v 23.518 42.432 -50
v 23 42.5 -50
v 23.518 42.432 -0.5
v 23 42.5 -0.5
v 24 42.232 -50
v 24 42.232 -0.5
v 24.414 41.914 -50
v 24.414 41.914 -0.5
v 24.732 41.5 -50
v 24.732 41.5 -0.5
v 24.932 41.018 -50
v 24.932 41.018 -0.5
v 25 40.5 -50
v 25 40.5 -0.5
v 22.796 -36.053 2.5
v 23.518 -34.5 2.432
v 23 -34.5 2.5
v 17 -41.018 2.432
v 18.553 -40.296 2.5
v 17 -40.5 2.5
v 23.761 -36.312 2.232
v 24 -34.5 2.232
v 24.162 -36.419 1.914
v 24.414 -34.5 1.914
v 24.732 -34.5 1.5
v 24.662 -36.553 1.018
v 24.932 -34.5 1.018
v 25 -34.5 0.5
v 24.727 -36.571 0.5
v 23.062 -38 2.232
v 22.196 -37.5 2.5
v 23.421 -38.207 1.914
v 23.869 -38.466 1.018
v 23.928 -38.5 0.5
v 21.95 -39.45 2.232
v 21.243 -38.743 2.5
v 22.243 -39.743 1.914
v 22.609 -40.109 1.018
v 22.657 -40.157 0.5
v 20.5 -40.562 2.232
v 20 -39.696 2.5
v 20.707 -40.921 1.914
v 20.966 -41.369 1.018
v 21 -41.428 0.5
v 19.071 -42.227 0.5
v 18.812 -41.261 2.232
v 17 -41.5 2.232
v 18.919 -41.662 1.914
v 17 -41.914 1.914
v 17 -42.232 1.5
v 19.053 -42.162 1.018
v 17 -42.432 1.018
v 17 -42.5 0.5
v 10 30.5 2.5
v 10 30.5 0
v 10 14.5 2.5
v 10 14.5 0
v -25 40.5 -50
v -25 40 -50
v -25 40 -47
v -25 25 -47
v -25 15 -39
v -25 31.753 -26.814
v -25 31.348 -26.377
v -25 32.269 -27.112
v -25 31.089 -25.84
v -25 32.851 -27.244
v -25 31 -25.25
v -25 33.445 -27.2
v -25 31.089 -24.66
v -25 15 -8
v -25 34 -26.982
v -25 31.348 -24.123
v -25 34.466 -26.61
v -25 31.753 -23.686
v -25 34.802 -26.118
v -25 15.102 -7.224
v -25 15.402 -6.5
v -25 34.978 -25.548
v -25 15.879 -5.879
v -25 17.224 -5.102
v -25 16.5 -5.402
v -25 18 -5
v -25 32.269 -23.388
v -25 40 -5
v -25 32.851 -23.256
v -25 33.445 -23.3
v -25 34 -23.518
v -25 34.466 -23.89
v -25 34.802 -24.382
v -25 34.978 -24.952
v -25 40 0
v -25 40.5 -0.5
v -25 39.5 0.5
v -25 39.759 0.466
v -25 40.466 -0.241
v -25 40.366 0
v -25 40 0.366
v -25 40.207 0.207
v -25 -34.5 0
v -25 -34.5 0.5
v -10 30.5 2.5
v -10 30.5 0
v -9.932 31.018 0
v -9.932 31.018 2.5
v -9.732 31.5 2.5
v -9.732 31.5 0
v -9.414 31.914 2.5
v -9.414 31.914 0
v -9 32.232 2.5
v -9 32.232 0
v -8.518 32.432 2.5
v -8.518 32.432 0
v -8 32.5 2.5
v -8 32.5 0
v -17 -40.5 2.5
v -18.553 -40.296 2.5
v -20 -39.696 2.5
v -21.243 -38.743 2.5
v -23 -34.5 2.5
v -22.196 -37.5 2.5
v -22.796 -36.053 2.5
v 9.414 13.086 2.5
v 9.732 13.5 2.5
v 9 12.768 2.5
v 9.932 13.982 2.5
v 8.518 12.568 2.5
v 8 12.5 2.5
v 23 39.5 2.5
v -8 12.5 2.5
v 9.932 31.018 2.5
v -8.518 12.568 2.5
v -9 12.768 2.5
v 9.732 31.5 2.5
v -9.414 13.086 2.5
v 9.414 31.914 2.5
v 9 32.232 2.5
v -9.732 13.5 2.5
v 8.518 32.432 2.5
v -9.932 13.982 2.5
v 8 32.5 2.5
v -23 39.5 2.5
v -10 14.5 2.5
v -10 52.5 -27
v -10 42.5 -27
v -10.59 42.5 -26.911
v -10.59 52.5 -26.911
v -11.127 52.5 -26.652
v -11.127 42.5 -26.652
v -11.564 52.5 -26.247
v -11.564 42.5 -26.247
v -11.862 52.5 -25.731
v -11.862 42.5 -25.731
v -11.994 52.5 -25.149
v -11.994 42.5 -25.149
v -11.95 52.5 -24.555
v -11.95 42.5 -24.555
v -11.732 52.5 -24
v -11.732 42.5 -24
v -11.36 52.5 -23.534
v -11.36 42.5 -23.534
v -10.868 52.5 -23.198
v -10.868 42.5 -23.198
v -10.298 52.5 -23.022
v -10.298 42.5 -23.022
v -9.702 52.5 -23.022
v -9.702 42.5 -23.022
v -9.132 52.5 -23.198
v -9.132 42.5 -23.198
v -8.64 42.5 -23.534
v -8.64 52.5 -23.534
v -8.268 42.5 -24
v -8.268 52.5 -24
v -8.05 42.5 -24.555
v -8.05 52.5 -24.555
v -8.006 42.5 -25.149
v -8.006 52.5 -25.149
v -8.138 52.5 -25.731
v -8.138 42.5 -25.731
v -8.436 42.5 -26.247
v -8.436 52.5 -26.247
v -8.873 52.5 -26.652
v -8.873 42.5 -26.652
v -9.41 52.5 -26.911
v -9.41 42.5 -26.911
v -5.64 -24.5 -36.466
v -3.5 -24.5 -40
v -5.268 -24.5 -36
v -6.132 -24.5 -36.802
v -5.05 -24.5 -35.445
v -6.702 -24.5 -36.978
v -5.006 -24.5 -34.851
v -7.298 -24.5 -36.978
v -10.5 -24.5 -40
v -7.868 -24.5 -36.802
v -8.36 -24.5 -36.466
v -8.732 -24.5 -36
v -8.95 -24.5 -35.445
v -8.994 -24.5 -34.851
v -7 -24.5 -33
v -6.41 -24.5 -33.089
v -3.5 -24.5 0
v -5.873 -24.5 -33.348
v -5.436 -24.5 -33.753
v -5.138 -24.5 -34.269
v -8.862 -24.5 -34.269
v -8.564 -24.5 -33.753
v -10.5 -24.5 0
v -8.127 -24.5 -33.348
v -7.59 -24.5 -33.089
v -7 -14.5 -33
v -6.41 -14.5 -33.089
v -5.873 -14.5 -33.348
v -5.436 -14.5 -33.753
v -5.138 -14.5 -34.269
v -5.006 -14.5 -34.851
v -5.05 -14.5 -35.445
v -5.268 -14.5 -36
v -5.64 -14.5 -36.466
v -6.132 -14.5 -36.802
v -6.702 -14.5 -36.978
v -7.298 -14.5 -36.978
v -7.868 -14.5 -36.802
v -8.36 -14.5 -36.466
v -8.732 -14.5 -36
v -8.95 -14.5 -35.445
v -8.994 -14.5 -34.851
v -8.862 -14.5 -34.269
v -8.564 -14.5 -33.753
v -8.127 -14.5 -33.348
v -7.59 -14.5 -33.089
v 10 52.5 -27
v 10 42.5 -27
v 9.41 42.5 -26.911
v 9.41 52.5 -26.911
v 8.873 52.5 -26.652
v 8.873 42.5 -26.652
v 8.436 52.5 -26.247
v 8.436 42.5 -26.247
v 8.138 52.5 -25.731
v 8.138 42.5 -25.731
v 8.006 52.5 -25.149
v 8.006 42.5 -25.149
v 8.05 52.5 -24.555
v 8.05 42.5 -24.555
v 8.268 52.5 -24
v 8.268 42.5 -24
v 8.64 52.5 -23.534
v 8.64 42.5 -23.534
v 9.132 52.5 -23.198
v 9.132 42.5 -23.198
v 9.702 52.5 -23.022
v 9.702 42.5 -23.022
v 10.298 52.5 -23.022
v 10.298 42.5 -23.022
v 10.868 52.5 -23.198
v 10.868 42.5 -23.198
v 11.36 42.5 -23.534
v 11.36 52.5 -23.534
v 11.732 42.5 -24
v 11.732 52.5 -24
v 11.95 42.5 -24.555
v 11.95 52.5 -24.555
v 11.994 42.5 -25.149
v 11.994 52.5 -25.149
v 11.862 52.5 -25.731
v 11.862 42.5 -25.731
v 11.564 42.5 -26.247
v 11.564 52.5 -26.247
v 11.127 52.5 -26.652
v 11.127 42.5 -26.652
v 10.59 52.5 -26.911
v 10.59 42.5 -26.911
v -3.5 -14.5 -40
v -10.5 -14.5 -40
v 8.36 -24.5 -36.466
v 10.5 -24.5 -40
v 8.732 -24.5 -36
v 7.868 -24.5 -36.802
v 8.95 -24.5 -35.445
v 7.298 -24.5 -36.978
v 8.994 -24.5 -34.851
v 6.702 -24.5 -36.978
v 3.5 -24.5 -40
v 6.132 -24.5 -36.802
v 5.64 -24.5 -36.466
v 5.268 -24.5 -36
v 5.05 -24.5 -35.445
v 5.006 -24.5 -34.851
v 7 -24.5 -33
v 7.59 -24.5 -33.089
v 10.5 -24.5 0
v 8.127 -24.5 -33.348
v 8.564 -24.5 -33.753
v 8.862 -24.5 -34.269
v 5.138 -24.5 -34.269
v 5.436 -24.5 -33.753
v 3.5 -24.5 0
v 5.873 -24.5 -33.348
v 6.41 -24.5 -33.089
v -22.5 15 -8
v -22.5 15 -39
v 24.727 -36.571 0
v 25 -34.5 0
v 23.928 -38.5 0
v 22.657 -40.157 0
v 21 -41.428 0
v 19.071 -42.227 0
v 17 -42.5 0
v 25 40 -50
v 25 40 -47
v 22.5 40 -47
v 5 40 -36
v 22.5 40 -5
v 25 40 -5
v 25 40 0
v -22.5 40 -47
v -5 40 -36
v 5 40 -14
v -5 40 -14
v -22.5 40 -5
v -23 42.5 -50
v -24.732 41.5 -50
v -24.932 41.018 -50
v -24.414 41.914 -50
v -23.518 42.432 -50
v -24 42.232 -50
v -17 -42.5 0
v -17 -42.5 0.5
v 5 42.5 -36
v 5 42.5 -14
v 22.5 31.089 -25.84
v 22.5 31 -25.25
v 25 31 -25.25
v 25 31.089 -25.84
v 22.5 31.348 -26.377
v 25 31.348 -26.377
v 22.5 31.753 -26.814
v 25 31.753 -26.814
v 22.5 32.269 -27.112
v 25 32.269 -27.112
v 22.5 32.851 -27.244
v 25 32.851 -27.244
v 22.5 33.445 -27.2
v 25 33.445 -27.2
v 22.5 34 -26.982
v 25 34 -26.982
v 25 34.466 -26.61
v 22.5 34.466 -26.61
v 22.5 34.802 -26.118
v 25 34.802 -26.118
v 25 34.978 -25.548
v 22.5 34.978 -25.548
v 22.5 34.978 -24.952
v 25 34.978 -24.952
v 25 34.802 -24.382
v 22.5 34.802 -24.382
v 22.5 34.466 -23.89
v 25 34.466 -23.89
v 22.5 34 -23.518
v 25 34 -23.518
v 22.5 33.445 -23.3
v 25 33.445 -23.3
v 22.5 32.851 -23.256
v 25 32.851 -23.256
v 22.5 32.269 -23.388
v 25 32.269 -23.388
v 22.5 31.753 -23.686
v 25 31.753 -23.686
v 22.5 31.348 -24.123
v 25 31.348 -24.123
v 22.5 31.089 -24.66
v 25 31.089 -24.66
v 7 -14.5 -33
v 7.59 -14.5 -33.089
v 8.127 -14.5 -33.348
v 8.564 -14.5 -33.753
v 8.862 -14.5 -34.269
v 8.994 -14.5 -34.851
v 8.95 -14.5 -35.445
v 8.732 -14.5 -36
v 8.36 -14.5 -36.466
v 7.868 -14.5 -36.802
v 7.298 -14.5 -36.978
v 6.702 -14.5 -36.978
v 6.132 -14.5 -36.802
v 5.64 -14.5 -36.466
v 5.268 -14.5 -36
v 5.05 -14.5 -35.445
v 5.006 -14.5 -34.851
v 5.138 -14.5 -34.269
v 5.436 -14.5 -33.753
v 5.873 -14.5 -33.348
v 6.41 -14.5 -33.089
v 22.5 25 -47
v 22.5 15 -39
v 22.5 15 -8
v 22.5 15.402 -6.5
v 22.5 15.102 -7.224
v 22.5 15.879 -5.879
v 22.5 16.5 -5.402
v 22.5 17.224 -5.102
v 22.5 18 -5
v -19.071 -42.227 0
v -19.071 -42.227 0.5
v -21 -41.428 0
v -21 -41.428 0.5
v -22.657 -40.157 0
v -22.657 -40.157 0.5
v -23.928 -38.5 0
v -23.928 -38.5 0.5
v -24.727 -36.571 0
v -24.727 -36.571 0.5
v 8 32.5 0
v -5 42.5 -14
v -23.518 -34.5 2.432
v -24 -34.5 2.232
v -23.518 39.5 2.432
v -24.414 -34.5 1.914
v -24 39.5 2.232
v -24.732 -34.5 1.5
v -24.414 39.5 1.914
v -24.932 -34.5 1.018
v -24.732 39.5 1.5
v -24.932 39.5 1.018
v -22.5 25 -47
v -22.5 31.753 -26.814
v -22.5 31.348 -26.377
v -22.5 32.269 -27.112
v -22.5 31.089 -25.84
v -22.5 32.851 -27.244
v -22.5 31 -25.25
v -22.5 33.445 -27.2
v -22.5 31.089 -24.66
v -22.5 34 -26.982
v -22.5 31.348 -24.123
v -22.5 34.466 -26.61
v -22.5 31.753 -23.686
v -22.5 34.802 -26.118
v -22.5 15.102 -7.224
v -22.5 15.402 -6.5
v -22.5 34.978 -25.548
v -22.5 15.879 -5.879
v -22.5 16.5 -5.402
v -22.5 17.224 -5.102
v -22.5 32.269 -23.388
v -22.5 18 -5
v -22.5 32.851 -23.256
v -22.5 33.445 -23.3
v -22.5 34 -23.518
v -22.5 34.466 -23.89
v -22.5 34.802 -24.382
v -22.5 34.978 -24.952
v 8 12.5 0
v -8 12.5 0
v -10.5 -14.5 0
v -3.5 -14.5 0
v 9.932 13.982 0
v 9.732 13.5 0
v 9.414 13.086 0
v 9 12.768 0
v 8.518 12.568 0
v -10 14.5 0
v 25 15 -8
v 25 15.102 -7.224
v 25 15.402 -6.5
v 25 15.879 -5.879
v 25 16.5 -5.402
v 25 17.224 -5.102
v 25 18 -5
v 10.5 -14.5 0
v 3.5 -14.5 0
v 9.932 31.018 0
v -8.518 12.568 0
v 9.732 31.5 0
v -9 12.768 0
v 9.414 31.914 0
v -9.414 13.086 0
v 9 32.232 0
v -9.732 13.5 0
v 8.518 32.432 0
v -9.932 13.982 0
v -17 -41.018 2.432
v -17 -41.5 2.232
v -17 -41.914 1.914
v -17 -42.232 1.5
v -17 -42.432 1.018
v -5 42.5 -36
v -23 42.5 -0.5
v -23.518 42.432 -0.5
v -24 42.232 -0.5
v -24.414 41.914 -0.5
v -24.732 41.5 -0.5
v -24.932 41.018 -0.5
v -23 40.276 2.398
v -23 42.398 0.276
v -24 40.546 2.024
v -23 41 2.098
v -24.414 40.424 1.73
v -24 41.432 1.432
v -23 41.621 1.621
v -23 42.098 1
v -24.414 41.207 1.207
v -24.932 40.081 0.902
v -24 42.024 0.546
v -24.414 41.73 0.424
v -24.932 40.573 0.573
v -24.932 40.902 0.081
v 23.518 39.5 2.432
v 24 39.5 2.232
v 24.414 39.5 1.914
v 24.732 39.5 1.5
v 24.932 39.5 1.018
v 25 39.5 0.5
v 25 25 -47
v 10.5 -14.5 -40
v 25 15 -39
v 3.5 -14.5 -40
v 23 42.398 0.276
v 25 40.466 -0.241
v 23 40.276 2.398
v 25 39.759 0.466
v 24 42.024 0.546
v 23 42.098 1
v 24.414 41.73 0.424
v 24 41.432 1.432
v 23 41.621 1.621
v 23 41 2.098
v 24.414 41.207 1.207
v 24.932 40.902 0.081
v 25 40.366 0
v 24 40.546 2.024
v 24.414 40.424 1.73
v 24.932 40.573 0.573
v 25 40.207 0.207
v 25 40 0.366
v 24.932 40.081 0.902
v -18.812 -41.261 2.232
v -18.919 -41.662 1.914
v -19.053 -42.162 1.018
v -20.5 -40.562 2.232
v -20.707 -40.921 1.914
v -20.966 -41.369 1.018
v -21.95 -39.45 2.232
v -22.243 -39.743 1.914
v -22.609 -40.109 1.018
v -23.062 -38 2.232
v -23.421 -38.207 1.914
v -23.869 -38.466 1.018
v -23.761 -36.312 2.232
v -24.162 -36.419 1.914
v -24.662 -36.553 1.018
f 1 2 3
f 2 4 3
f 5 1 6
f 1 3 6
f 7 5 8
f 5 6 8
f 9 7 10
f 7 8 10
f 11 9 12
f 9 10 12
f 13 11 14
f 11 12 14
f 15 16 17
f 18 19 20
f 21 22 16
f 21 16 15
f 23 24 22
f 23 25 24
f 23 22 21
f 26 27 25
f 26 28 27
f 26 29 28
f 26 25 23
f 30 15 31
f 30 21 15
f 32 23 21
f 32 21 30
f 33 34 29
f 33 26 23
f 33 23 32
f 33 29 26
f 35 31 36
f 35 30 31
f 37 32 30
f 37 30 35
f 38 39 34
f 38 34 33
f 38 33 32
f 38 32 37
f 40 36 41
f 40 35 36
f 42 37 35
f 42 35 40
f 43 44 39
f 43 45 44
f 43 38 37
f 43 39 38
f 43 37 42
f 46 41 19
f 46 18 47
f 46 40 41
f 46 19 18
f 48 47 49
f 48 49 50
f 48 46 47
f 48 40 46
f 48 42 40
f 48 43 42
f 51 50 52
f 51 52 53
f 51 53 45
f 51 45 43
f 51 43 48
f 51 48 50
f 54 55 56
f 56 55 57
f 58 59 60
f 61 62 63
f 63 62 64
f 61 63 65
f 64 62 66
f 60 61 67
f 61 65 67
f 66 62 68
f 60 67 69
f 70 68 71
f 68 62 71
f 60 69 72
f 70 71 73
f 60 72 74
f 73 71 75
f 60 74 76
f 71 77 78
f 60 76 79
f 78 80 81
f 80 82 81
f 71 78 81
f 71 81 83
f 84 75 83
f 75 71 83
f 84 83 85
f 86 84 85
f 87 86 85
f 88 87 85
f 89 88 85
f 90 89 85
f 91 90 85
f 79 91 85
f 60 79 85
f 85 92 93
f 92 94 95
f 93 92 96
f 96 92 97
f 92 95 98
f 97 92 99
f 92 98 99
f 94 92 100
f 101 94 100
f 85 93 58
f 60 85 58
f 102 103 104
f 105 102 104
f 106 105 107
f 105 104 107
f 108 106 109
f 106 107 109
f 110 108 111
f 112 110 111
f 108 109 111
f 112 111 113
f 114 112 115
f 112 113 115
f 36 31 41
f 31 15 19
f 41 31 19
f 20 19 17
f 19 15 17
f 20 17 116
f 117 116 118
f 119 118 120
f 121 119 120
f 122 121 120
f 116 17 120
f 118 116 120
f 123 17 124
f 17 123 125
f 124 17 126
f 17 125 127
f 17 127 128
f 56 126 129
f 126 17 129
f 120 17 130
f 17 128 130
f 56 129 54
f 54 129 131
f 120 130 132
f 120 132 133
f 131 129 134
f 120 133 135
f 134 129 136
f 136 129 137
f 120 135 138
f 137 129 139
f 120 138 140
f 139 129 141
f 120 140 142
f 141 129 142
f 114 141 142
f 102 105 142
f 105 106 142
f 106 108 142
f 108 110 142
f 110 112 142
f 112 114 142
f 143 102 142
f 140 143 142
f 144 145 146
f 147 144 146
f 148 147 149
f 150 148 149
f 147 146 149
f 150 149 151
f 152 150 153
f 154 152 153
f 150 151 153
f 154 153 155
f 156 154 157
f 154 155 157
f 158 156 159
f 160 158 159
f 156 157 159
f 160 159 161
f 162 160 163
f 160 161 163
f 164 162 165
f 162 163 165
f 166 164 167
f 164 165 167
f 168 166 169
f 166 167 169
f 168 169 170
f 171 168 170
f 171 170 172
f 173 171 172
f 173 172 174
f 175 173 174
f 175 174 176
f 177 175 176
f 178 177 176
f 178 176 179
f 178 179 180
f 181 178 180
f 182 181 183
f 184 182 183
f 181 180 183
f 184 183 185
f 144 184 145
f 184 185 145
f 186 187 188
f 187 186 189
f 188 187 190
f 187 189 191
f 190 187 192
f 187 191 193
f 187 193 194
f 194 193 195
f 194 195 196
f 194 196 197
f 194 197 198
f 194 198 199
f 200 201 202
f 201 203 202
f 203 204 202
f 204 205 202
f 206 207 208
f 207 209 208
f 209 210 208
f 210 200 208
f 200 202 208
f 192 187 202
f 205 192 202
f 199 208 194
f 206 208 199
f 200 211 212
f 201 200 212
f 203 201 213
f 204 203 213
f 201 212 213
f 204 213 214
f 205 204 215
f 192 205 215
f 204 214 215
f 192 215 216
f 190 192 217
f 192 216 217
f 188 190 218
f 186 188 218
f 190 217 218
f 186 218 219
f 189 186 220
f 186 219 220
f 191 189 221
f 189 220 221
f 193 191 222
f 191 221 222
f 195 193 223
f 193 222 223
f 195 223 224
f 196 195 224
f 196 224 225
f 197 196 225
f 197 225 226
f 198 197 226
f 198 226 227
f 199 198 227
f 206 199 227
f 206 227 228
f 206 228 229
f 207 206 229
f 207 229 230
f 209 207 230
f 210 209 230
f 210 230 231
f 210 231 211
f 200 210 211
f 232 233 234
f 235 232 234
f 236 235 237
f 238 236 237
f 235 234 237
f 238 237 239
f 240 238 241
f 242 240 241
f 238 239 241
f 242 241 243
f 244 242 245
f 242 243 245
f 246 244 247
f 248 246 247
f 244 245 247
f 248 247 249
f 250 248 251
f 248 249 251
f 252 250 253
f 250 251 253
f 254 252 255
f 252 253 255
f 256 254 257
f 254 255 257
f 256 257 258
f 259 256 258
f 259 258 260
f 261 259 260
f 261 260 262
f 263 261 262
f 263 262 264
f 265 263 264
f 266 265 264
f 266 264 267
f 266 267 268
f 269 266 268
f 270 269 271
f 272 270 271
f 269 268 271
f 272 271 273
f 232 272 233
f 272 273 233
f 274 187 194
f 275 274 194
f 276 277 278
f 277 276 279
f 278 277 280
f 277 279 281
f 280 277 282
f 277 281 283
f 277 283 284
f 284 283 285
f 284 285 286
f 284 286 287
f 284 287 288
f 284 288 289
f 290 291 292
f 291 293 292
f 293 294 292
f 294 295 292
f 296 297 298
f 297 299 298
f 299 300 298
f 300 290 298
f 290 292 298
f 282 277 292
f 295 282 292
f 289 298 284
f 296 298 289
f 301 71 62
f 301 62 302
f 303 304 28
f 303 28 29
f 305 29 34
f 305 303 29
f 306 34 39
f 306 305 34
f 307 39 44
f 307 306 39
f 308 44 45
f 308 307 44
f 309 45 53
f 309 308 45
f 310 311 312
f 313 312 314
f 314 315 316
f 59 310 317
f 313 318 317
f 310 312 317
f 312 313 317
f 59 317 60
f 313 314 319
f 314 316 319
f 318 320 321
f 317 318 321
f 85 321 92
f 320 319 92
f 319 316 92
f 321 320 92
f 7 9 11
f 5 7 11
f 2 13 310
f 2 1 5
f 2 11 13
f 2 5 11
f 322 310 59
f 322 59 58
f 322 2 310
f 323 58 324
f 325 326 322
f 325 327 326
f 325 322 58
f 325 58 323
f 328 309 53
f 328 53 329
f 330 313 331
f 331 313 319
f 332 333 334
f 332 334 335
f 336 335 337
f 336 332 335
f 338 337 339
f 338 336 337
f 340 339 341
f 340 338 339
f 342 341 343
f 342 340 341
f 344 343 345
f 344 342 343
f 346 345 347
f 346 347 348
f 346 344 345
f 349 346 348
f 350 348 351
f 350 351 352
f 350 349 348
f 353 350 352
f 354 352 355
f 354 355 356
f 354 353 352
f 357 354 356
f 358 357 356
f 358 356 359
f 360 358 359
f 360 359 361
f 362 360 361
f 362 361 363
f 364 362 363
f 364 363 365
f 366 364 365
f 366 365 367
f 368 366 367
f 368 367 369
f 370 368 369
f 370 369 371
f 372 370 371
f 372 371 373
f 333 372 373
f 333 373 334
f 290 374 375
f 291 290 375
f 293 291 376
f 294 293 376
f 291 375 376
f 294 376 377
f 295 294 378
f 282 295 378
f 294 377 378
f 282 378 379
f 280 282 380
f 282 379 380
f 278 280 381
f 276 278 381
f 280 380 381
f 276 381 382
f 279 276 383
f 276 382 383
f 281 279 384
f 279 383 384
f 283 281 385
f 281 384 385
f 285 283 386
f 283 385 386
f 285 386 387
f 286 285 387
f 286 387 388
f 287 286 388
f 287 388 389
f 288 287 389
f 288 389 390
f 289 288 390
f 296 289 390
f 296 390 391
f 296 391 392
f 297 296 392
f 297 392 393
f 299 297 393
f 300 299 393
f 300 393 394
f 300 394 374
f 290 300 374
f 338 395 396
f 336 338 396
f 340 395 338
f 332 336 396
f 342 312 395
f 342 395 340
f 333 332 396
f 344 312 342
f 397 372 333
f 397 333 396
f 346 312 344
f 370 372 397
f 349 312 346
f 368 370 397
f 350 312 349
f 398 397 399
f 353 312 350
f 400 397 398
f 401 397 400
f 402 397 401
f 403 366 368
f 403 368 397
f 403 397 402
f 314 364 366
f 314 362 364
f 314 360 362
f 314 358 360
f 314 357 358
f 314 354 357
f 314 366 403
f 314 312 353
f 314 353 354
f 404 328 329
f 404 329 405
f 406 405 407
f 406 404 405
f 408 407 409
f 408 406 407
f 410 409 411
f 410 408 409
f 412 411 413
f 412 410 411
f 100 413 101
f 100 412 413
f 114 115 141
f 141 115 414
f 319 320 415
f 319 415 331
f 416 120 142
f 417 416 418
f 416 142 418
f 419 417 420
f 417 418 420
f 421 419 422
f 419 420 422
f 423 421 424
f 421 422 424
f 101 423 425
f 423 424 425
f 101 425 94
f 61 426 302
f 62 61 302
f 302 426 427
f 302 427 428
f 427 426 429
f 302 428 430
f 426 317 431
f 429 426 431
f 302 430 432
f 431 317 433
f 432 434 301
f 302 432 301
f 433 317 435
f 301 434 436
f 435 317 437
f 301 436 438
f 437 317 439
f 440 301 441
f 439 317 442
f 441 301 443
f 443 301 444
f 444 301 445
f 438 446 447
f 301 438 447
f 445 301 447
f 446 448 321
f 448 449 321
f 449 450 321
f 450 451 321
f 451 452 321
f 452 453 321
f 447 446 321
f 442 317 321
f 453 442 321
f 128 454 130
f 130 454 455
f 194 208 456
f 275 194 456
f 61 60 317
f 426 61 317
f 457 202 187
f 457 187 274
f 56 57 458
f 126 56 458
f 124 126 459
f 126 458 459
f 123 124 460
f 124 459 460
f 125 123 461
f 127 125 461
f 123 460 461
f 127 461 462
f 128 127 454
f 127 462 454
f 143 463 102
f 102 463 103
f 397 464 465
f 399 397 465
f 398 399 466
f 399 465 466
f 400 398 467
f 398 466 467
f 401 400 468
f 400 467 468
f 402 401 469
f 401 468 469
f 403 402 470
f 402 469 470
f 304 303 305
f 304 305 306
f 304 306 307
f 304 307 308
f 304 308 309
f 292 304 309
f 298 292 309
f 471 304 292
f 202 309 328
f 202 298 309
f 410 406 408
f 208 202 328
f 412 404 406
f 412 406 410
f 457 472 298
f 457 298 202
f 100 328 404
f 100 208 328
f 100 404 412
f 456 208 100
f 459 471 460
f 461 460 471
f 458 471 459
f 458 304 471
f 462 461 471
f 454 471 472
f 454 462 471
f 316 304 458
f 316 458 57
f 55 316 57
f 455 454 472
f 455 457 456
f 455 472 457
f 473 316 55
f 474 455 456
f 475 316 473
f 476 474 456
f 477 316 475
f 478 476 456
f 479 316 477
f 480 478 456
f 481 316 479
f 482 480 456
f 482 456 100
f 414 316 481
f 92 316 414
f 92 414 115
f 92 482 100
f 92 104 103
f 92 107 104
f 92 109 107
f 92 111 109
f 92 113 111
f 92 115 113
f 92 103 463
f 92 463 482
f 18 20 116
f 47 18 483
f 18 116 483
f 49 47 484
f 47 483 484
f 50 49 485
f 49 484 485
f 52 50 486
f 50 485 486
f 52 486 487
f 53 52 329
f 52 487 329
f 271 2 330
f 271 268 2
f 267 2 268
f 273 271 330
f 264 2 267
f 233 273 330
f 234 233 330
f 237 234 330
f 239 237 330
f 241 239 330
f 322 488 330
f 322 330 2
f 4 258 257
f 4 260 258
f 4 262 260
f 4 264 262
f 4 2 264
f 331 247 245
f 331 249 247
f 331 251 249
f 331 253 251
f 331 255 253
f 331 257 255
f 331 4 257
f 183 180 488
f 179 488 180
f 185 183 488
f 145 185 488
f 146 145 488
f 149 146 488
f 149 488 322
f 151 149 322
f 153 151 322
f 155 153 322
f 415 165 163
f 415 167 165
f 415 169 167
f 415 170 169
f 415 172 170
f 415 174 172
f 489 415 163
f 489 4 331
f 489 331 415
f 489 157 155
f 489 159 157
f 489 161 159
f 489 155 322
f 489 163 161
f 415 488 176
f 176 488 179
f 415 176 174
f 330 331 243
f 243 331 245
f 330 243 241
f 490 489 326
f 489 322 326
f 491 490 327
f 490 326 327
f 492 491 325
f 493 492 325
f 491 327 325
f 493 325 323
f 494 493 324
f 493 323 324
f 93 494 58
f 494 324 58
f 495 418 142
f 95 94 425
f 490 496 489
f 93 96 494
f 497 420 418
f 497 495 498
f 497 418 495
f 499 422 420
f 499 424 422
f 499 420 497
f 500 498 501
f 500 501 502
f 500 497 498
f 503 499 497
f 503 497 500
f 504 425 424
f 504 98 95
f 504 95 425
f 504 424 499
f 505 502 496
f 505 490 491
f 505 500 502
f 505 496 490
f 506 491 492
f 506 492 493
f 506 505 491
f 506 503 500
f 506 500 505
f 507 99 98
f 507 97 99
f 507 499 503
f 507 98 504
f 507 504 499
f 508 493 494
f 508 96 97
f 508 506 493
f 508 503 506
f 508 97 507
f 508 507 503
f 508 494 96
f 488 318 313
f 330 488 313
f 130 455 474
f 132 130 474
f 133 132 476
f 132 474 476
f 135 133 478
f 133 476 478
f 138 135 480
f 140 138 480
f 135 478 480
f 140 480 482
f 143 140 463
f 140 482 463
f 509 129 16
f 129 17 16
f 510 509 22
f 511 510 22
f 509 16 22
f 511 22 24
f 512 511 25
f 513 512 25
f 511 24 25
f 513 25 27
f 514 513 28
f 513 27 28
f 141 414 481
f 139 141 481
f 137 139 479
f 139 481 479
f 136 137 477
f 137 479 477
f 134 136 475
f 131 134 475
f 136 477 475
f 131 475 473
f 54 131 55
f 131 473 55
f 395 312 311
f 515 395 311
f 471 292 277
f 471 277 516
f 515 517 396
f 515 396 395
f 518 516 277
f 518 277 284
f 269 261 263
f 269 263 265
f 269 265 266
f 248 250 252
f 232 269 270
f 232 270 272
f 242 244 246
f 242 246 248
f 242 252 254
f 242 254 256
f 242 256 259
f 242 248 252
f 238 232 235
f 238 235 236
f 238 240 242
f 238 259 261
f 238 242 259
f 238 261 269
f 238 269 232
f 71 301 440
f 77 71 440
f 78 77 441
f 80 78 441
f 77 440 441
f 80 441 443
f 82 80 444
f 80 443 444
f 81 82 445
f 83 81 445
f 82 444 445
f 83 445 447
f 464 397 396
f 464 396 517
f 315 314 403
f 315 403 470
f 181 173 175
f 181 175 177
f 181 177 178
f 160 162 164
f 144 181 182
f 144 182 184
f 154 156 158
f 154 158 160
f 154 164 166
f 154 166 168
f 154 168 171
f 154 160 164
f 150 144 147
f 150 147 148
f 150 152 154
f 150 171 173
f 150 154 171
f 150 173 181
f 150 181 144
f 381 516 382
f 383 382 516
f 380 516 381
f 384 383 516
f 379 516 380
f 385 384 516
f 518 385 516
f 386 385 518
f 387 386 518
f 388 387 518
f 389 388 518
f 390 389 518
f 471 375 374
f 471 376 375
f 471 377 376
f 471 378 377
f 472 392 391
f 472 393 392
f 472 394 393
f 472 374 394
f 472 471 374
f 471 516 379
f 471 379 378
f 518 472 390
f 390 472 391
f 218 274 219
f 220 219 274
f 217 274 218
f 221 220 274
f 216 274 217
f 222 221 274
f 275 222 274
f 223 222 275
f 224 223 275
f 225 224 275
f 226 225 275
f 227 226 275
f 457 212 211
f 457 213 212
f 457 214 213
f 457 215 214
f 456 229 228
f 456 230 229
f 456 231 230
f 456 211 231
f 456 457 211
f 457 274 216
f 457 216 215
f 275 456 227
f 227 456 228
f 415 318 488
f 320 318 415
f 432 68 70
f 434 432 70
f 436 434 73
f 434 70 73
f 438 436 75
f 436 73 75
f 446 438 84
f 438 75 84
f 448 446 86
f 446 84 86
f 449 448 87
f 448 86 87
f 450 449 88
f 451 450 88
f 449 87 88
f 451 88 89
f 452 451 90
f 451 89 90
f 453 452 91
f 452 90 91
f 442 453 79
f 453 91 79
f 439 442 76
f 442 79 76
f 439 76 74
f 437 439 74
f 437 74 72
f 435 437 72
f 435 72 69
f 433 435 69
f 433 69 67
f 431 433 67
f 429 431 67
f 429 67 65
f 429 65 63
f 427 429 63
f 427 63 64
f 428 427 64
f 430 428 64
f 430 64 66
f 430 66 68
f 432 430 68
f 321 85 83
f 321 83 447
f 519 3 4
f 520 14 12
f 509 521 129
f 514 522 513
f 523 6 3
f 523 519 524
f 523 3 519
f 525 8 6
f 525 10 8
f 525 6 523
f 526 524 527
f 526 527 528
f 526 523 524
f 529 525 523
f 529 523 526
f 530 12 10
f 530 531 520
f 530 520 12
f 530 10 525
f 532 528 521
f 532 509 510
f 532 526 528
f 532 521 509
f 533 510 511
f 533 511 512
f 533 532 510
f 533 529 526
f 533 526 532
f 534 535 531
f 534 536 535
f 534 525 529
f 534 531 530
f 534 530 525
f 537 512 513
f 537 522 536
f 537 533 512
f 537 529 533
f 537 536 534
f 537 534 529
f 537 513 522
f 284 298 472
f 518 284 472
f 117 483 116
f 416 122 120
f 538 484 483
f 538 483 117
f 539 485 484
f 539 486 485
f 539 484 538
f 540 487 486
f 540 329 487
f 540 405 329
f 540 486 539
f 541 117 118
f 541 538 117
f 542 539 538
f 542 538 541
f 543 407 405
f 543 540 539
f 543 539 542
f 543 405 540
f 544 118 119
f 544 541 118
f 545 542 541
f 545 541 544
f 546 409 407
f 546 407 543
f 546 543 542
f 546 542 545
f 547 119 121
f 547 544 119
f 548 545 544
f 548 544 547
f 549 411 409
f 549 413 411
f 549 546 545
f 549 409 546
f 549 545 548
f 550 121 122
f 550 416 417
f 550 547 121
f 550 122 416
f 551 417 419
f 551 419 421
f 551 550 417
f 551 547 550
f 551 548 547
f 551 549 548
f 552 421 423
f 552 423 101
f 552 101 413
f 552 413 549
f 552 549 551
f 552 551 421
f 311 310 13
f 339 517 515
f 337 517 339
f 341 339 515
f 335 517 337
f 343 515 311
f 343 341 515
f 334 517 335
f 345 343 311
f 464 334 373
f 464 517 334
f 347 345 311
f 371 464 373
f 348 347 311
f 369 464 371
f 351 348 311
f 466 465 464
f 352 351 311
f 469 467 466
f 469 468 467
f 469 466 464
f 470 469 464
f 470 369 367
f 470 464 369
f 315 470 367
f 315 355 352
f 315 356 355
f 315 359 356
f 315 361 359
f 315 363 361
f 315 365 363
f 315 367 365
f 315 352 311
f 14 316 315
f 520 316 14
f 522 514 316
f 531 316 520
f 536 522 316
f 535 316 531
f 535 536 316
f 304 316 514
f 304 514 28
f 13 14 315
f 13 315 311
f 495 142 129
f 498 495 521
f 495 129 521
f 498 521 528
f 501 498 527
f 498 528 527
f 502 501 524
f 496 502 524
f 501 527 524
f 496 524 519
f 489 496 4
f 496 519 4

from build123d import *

# Parameters (mm, degrees)
SALIENTE_EXTRUIR1_DEPTH = 2.5
CROQUIS4_W              = 50
CROQUIS4_H              = 2.5
SALIENTE_EXTRUIR2_DEPTH = 50
REDONDEO2_R             = 3
CROQUIS6_W              = 2.5
CROQUIS6_H              = 42
SALIENTE_EXTRUIR3_DEPTH = 25
REDONDEO3_R             = 2
CORTAR_EXTRUIR1_DEPTH   = 25
CORTAR_EXTRUIR2_START   = -25
CORTAR_EXTRUIR2_DEPTH   = 25
CROQUIS11_W             = 10
CROQUIS11_H             = 22
CORTAR_EXTRUIR3_DEPTH   = 25
CROQUIS12_R             = 2
CORTAR_EXTRUIR4_DEPTH   = 25
CORTAR_EXTRUIR5_START   = -25
CROQUIS13_R             = 2
CORTAR_EXTRUIR5_DEPTH   = 25
CROQUIS14_R             = 2
SALIENTE_EXTRUIR4_DEPTH = 10
CROQUIS15_W             = 7
CROQUIS15_H             = 10
SALIENTE_EXTRUIR5_DEPTH = 40
CROQUIS17_R             = 2
CORTAR_EXTRUIR6_DEPTH   = 50
CROQUIS18_R             = 2
CORTAR_EXTRUIR7_DEPTH   = 50


with BuildPart() as part:
    # Croquis1 → Saliente-Extruir1 (new body)
    with BuildSketch(Plane.XY):
        with BuildLine():
            Line((17, -42.5), (-17, -42.5))
            ThreePointArc((-17, -42.5), (-22.656854249, -40.156854249), (-25, -34.5))
            Line((-25, -34.5), (-25, 42.5))
            Line((-25, 42.5), (25, 42.5))
            Line((25, 42.5), (25, -34.5))
            ThreePointArc((25, -34.5), (22.656854249, -40.156854249), (17, -42.5))
        make_face()
        with BuildLine():
            Line((8, 12.5), (-8, 12.5))
            ThreePointArc((-8, 12.5), (-9.414213562, 13.085786438), (-10, 14.5))
            Line((-10, 14.5), (-10, 30.5))
            ThreePointArc((-10, 30.5), (-9.414213562, 31.914213562), (-8, 32.5))
            Line((-8, 32.5), (8, 32.5))
            ThreePointArc((8, 32.5), (9.414213562, 31.914213562), (10, 30.5))
            Line((10, 30.5), (10, 14.5))
            ThreePointArc((10, 14.5), (9.414213562, 13.085786438), (8, 12.5))
        make_face(mode=Mode.SUBTRACT)
    extrude(amount=SALIENTE_EXTRUIR1_DEPTH)

    # Croquis4 → Saliente-Extruir2 (add)
    with BuildSketch(Plane(origin=(0, 0, 0), x_dir=(-1, 0, 0), z_dir=(0, 0, -1))):
        with Locations((0, 41.25)):
            Rectangle(CROQUIS4_W, CROQUIS4_H)
    extrude(amount=SALIENTE_EXTRUIR2_DEPTH)

    # Redondeo2
    redondeo2_edges = [part.edges().sort_by_distance(p)[0] for p in [
        (0, 42.5, 2.5),
    ]]
    fillet(redondeo2_edges, radius=REDONDEO2_R)

    # Croquis6 → Saliente-Extruir3 (add)
    with BuildSketch(Plane.XZ.offset(-40)):
        with Locations((-23.75, -26)):
            Rectangle(CROQUIS6_W, CROQUIS6_H)
        with Locations((23.75, -26)):
            Rectangle(CROQUIS6_W, CROQUIS6_H)
    extrude(amount=SALIENTE_EXTRUIR3_DEPTH)

    # Redondeo3
    redondeo3_edges = [part.edges().sort_by_distance(p)[0] for p in [
        (0, -42.5, 2.5),
        (22.656854249, -40.156854249, 2.5),
        (25, 2.5, 2.5),
        (-25, 2.5, 2.5),
        (-25, 42.5, -25.25),
        (-25, 41.621320344, 1.621320344),
        (25, 42.5, -25.25),
        (25, 41.621320344, 1.621320344),
        (-22.656854249, -40.156854249, 2.5),
    ]]
    fillet(redondeo3_edges, radius=REDONDEO3_R)

    # Croquis7 → Cortar-Extruir1 (cut)
    with BuildSketch(Plane(origin=(25, 0, 0), x_dir=(0, 0, -1), z_dir=(1, 0, 0))):
        Polygon((39, 15), (47, 25), (47, 15), align=None)
        with BuildLine():
            Line((5, 18), (5, 15))
            Line((5, 15), (8, 15))
            ThreePointArc((8, 15), (5.878679656, 15.878679656), (5, 18))
        make_face()
    extrude(amount=-CORTAR_EXTRUIR1_DEPTH, mode=Mode.SUBTRACT)

    # Croquis8 → Cortar-Extruir2 (cut)
    with BuildSketch(Plane.ZY.offset(25).offset(CORTAR_EXTRUIR2_START)):
        Polygon((-39, 15), (-47, 15), (-47, 25), align=None)
        with BuildLine():
            Line((-5, 18), (-5, 15))
            Line((-5, 15), (-8, 15))
            ThreePointArc((-8, 15), (-5.878679656, 15.878679656), (-5, 18))
        make_face()
    extrude(amount=CORTAR_EXTRUIR2_DEPTH, mode=Mode.SUBTRACT)

    # Croquis11 → Cortar-Extruir3 (cut)
    with BuildSketch(Plane.XZ.offset(-40)):
        with Locations((0, -25)):
            Rectangle(CROQUIS11_W, CROQUIS11_H)
    extrude(amount=-CORTAR_EXTRUIR3_DEPTH, mode=Mode.SUBTRACT)

    # Croquis12 → Cortar-Extruir4 (cut)
    with BuildSketch(Plane.ZY.offset(25)):
        with Locations(Location((-25.25, 33, 0), (0, 0, 270))):
            Circle(CROQUIS12_R)
    extrude(amount=-CORTAR_EXTRUIR4_DEPTH, mode=Mode.SUBTRACT)

    # Croquis13 → Cortar-Extruir5 (cut)
    with BuildSketch(Plane(origin=(25, 0, 0), x_dir=(0, 0, -1), z_dir=(1, 0, 0)).offset(CORTAR_EXTRUIR5_START)):
        with Locations(Location((25.25, 33, 0), (0, 0, 270))):
            Circle(CROQUIS13_R)
    extrude(amount=CORTAR_EXTRUIR5_DEPTH, mode=Mode.SUBTRACT)

    # Croquis14 → Saliente-Extruir4 (add)
    with BuildSketch(Plane(origin=(0, 42.5, 0), x_dir=(1, 0, 0), z_dir=(0, 1, 0))):
        with Locations(Location((-10, 25, 0), (0, 0, 90))):
            Circle(CROQUIS14_R)
        with Locations(Location((10, 25, 0), (0, 0, 90))):
            Circle(CROQUIS14_R)
    extrude(amount=SALIENTE_EXTRUIR4_DEPTH)

    # Croquis15 → Saliente-Extruir5 (add)
    with BuildSketch(Plane(origin=(0, 0, 0), x_dir=(-1, 0, 0), z_dir=(0, 0, -1))):
        with Locations((-7, -19.5)):
            Rectangle(CROQUIS15_W, CROQUIS15_H)
        with Locations((7, -19.5)):
            Rectangle(CROQUIS15_W, CROQUIS15_H)
    extrude(amount=SALIENTE_EXTRUIR5_DEPTH)

    # Croquis17 → Cortar-Extruir6 (cut)
    with BuildSketch(Plane(origin=(0, -14.5, 0), x_dir=(1, 0, 0), z_dir=(0, 1, 0))):
        with Locations(Location((-7, 35, 0), (0, 0, 270))):
            Circle(CROQUIS17_R)
    extrude(amount=-CORTAR_EXTRUIR6_DEPTH, mode=Mode.SUBTRACT)

    # Croquis18 → Cortar-Extruir7 (cut)
    with BuildSketch(Plane(origin=(0, -14.5, 0), x_dir=(1, 0, 0), z_dir=(0, 1, 0))):
        with Locations(Location((7, 35, 0), (0, 0, 270))):
            Circle(CROQUIS18_R)
    extrude(amount=-CORTAR_EXTRUIR7_DEPTH, mode=Mode.SUBTRACT)


solid = part.part
